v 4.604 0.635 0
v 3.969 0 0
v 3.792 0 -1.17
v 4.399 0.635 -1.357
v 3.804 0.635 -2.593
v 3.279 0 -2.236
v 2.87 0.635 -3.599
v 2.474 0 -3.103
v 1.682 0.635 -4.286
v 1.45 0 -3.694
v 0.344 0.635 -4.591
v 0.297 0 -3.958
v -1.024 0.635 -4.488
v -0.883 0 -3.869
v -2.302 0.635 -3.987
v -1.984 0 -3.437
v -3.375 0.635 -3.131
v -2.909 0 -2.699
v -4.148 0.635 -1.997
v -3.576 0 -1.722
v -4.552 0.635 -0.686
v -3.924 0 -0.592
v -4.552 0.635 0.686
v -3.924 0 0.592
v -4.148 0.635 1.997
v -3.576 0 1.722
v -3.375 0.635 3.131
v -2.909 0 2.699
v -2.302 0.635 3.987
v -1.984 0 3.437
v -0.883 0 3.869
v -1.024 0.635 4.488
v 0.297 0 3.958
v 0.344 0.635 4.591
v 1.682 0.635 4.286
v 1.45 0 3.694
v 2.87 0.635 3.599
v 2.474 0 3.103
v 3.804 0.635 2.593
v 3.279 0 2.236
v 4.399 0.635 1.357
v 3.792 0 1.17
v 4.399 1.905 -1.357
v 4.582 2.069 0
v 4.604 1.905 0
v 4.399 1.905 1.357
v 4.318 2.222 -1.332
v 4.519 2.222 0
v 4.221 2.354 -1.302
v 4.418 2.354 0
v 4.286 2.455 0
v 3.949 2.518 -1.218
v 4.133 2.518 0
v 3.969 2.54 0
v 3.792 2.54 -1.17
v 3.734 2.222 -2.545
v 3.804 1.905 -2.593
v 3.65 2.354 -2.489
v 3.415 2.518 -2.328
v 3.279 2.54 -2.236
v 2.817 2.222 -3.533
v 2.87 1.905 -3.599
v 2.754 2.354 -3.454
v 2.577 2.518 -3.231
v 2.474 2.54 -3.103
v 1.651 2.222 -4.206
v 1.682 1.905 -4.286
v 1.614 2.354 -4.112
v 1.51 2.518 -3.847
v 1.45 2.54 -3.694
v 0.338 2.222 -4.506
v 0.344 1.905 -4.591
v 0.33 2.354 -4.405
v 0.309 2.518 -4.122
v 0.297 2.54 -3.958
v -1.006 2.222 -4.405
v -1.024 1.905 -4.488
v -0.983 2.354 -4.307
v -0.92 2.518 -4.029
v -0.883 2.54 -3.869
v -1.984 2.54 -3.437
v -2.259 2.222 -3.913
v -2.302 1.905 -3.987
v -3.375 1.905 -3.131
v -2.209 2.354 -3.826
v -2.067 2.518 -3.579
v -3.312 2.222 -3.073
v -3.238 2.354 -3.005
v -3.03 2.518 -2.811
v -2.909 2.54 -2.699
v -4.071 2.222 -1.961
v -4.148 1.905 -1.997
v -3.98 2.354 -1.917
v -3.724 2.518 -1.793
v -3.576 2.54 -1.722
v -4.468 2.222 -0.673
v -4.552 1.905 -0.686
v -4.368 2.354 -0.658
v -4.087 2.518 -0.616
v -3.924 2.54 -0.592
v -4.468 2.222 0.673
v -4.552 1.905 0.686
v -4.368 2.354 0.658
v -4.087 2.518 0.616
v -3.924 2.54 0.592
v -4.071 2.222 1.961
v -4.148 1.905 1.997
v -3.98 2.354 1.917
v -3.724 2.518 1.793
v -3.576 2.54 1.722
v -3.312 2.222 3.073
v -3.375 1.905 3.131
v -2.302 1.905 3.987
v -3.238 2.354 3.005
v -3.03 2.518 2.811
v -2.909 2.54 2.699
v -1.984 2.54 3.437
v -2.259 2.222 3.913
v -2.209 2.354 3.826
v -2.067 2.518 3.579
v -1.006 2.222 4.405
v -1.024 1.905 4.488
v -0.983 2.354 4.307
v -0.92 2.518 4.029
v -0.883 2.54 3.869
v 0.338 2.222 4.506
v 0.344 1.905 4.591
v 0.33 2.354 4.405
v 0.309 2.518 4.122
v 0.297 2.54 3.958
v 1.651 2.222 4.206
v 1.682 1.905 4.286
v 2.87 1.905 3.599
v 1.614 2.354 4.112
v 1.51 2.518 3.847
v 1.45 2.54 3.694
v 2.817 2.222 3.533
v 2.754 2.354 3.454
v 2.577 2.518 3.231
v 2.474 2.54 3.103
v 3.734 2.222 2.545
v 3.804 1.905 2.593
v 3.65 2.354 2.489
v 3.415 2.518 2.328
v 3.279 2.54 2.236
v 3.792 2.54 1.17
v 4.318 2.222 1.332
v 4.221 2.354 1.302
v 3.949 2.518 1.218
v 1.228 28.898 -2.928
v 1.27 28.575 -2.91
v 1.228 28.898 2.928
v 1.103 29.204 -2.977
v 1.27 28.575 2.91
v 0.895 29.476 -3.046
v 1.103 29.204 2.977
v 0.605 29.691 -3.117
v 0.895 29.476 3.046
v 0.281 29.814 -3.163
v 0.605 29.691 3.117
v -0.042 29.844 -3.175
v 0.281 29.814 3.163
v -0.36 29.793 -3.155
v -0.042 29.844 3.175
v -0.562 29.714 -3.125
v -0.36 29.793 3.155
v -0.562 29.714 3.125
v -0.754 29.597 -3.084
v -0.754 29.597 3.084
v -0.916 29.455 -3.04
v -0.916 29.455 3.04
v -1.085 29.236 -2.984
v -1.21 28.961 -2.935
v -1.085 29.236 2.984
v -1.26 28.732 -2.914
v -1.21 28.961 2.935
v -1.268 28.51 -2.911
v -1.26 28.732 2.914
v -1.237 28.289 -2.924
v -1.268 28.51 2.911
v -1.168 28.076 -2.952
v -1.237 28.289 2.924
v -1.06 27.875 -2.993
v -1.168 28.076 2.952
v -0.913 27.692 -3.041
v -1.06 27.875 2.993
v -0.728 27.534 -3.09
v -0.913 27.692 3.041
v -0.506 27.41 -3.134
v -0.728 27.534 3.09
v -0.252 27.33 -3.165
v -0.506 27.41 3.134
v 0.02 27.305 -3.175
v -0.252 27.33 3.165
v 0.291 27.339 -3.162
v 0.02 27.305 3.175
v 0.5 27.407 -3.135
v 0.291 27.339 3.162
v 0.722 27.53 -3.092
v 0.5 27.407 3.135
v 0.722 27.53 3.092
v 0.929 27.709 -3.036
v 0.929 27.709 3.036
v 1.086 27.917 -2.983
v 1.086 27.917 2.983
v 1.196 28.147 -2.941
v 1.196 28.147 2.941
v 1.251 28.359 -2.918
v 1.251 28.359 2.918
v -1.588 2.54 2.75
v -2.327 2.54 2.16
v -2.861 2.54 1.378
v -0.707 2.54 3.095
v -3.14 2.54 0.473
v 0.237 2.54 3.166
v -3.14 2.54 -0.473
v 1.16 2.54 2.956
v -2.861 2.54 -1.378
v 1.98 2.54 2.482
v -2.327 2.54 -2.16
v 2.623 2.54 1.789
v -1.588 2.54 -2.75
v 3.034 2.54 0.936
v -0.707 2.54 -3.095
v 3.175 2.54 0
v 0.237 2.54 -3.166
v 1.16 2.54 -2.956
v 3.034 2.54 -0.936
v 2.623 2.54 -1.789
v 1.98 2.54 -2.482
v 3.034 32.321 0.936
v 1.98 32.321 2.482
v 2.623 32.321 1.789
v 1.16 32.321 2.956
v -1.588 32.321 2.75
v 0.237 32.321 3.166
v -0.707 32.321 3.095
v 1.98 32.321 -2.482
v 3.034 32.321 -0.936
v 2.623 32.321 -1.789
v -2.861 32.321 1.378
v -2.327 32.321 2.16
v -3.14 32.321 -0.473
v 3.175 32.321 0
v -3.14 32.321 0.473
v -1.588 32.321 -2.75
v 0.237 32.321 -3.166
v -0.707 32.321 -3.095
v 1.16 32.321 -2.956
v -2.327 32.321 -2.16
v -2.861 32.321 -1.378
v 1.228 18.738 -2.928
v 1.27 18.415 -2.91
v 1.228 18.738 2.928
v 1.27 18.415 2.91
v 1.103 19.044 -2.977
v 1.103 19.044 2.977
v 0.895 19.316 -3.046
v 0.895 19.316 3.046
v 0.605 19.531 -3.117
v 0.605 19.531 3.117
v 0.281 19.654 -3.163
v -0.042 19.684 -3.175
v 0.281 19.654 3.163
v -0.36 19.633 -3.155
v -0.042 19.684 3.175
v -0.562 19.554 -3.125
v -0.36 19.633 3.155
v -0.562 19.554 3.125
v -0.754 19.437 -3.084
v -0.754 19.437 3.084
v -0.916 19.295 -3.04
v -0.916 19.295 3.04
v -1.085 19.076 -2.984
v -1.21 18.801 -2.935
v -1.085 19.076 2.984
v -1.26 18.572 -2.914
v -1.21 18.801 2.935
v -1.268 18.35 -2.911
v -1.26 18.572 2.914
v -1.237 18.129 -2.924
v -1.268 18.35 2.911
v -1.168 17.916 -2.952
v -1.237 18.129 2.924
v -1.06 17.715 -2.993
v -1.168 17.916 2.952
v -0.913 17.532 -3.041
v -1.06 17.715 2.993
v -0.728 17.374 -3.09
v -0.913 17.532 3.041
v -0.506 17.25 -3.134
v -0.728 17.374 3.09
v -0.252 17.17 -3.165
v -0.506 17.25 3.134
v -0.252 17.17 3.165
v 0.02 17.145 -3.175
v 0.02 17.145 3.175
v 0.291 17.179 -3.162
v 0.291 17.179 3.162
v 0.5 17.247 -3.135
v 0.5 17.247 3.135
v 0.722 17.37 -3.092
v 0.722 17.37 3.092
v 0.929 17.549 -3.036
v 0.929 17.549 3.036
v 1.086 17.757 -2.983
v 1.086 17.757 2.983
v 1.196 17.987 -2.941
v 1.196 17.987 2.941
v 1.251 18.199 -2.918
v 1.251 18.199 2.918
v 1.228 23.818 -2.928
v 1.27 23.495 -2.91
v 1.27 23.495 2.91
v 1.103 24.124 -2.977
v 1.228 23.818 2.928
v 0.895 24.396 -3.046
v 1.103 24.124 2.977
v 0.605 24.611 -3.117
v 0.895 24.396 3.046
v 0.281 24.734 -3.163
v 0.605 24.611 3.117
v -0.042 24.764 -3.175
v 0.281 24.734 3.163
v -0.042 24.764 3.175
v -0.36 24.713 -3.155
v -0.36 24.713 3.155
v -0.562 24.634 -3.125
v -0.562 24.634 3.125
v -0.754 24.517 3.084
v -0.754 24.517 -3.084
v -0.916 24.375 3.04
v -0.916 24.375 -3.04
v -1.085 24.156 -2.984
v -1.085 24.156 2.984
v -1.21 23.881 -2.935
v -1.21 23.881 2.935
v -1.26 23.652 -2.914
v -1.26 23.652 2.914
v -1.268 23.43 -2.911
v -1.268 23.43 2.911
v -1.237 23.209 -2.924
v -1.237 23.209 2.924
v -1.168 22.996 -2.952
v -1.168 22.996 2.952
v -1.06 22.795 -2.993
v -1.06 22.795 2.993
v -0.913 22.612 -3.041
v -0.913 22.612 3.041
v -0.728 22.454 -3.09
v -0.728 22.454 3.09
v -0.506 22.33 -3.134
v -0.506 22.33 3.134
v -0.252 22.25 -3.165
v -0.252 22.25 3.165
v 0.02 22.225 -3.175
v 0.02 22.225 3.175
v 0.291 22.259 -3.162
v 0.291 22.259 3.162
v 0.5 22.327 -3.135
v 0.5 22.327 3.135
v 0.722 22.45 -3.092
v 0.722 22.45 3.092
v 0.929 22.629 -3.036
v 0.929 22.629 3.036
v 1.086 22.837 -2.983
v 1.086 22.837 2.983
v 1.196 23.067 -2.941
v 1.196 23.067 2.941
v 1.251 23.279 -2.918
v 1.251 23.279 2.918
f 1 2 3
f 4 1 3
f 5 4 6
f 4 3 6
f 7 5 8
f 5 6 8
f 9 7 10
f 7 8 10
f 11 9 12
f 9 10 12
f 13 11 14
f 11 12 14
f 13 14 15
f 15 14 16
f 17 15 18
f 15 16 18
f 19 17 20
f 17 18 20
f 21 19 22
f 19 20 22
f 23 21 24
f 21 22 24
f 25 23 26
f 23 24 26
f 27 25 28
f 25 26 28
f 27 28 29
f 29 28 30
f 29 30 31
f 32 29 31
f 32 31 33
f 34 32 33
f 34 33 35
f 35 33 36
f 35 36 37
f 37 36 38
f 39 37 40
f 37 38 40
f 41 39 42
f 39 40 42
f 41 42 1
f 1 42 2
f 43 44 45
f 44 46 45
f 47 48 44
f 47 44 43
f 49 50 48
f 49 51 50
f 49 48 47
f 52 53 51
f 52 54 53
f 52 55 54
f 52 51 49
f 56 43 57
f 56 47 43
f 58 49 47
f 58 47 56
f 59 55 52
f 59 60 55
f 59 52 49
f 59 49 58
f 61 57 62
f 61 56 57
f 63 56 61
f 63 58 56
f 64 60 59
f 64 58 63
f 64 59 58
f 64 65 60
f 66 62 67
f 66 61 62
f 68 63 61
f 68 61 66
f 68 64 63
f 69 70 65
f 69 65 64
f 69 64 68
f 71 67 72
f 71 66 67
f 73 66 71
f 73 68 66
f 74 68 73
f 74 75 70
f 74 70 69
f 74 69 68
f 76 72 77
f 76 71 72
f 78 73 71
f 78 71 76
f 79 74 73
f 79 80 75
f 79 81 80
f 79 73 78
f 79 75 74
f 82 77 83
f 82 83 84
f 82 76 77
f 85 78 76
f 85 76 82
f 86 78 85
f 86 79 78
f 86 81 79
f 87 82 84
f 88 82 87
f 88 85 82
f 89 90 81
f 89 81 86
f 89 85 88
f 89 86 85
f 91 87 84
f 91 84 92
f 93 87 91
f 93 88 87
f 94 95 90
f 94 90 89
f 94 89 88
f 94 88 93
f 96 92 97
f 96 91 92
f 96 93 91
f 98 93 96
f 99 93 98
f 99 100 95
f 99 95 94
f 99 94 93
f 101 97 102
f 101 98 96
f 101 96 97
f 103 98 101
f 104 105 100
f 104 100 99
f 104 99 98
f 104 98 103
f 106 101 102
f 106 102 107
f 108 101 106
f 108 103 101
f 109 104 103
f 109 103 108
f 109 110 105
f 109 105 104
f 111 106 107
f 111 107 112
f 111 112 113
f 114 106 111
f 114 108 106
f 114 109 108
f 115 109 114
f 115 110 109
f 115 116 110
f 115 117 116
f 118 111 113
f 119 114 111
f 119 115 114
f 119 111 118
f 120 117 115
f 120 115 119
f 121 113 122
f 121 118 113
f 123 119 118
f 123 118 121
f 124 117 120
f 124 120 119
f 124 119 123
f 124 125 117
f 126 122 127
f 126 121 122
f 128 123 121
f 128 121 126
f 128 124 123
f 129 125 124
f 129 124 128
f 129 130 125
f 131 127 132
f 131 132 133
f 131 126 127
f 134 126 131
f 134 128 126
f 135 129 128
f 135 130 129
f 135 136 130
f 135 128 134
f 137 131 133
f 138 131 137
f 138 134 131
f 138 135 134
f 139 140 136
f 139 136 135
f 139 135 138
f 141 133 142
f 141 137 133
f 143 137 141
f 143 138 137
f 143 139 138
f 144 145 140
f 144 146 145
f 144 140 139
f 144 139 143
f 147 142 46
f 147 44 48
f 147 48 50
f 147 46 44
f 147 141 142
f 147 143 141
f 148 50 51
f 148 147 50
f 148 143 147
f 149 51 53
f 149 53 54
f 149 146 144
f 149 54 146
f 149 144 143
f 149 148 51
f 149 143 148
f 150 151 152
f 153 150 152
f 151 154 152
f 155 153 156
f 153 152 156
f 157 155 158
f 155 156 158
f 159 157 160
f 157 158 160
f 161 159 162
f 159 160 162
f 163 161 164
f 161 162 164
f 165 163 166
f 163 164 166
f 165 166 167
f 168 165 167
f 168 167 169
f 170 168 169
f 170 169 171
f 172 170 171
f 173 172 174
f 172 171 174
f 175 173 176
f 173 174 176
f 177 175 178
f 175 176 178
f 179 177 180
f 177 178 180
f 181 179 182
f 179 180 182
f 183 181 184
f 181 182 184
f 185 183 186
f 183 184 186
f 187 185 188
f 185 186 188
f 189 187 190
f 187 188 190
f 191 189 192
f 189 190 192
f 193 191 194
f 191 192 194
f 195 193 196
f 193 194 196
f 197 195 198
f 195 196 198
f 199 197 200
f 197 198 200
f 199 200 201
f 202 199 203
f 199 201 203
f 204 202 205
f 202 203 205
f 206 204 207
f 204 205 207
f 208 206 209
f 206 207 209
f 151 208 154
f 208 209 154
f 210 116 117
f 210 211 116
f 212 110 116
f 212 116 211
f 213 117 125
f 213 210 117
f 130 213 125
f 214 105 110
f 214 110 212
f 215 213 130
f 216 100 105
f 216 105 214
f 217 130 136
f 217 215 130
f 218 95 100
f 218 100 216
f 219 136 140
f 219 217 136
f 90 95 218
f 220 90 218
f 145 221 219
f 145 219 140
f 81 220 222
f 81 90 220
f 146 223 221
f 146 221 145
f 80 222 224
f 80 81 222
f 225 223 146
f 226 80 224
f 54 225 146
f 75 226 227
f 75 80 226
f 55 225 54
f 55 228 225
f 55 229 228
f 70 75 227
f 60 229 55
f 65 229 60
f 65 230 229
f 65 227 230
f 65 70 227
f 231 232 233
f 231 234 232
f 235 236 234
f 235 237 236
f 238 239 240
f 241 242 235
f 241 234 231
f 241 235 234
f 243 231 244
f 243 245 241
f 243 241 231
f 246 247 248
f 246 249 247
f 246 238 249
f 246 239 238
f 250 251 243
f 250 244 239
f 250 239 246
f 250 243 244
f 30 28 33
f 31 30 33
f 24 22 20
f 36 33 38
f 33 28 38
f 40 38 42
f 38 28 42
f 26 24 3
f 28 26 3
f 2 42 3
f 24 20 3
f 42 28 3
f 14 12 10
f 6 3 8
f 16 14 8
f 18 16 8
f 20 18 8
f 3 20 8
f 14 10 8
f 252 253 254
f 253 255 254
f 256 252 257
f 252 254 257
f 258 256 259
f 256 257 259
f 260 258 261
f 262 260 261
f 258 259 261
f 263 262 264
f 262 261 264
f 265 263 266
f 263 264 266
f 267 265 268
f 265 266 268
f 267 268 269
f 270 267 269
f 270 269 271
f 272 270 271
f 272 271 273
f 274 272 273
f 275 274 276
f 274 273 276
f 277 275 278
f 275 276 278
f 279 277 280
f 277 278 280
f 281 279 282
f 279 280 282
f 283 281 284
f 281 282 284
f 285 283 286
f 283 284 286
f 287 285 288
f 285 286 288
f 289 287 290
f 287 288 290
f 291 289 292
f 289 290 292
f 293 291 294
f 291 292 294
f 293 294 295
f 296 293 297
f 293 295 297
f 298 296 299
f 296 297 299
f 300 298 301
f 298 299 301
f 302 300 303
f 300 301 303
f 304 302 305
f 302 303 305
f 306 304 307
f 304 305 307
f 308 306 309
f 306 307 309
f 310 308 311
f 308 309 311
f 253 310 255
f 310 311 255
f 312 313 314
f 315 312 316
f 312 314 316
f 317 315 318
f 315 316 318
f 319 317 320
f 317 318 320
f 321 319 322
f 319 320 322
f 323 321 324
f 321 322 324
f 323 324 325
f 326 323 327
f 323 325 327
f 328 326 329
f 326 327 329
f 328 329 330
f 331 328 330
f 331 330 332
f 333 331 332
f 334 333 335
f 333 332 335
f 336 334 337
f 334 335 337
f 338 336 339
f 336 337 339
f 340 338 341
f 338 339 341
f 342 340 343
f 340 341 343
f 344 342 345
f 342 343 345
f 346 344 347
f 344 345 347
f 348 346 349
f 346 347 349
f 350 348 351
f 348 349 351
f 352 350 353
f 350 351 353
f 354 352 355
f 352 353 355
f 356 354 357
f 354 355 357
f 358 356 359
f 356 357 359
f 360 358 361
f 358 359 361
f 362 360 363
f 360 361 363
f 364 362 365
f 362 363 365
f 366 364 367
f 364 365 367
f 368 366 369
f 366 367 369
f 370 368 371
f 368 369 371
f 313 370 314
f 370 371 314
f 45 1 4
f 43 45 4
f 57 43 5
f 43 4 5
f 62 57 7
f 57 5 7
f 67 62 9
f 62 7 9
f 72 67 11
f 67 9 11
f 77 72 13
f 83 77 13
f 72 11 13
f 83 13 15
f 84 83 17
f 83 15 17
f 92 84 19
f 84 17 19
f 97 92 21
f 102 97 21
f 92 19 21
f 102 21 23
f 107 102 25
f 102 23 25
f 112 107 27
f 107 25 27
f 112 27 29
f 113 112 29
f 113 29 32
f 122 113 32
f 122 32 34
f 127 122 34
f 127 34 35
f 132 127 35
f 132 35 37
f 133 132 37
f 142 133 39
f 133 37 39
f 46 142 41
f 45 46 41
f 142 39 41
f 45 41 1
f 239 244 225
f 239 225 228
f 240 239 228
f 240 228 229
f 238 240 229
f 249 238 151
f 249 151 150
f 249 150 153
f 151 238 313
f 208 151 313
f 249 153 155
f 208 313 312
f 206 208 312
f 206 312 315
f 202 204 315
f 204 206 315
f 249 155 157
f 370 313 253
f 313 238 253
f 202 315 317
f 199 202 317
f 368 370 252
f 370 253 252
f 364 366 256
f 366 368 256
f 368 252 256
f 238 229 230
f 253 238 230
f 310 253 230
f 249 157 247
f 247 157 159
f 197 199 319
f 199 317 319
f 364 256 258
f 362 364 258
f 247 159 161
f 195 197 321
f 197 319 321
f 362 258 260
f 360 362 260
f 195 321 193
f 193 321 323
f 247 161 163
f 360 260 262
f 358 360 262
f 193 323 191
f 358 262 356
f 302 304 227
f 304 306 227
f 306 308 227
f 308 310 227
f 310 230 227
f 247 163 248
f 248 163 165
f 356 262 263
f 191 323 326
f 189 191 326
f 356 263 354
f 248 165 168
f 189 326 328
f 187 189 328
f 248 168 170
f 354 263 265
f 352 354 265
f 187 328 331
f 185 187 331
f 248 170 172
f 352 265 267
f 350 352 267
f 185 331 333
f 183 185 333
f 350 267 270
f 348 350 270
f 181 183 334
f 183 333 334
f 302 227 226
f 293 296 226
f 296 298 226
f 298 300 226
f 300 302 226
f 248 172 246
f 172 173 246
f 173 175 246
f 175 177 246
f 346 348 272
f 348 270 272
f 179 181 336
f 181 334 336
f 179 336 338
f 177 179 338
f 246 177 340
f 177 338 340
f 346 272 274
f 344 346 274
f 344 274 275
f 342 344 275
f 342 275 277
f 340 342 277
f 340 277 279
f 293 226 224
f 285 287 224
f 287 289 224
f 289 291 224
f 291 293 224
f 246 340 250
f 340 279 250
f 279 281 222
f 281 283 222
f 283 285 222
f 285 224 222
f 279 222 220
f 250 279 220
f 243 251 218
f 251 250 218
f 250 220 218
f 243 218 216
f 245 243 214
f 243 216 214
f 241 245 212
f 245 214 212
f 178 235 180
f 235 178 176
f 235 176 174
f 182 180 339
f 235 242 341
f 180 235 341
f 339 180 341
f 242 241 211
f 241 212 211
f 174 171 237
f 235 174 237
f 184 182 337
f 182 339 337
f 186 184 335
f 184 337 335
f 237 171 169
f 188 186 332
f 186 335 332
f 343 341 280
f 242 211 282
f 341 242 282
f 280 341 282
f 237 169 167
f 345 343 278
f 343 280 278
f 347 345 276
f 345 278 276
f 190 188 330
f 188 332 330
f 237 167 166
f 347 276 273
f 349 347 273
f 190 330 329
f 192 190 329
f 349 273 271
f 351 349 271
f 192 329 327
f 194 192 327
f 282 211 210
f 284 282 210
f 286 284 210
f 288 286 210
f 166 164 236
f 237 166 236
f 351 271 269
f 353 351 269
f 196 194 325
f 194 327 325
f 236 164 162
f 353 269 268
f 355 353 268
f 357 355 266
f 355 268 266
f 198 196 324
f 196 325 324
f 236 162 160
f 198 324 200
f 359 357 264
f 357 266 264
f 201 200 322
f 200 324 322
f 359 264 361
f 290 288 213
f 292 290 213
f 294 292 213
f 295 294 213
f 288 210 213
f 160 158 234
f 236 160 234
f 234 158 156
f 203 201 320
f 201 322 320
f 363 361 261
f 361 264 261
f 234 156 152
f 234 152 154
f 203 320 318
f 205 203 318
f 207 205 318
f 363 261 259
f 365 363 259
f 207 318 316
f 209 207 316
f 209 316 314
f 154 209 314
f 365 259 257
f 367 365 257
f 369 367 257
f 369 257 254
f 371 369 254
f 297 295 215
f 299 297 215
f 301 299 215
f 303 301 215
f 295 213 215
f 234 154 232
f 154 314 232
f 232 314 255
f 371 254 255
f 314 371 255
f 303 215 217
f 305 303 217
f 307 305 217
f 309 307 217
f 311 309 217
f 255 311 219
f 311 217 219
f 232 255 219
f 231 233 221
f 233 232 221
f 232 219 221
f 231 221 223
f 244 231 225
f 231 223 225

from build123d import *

# Parameters (mm, degrees)
SKETCH1_R               = 4.60375
BOSS_EXTRUDE1_DEPTH     = 2.54
SKETCH2_R               = 3.175
BOSS_EXTRUDE2_DEPTH     = 45.72
SKETCH3_R               = 1.27
CUT_EXTRUDE1_DEPTH      = 5.60375
CUT_EXTRUDE1_DEPTH_BACK = 5.60375
FILLET1_R               = 0.635
CHAMFER1_SIZE           = 0.635
SKETCH4_W               = 16.845680721
SKETCH4_H               = 19.604839444
CUT_EXTRUDE2_DEPTH      = 5.60375
CUT_EXTRUDE2_DEPTH_BACK = 5.6037501


with BuildPart() as part:
    # Sketch1 → Boss-Extrude1 (new body)
    with BuildSketch(Plane(origin=(0, 0, 0), x_dir=(1, 0, 0), z_dir=(0, 1, 0))):
        Circle(SKETCH1_R)
    extrude(amount=BOSS_EXTRUDE1_DEPTH)

    # Sketch2 → Boss-Extrude2 (add)
    with BuildSketch(Plane(origin=(0, 2.54, 0), x_dir=(1, 0, 0), z_dir=(0, 1, 0))):
        Circle(SKETCH2_R)
    extrude(amount=BOSS_EXTRUDE2_DEPTH)

    # Sketch3 → Cut-Extrude1 (cut, two sides)
    with BuildSketch(Plane.XY) as cut_extrude1_sk:
        with Locations((0, 18.415)):
            Circle(SKETCH3_R)
        with Locations((0, 23.495)):
            Circle(SKETCH3_R)
        with Locations((0, 28.575)):
            Circle(SKETCH3_R)
        with Locations((0, 33.655)):
            Circle(SKETCH3_R)
        with Locations((0, 38.735)):
            Circle(SKETCH3_R)
        with Locations((0, 43.815)):
            Circle(SKETCH3_R)
    extrude(amount=CUT_EXTRUDE1_DEPTH, mode=Mode.SUBTRACT)
    extrude(cut_extrude1_sk.sketch, amount=-CUT_EXTRUDE1_DEPTH_BACK, mode=Mode.SUBTRACT)

    # Fillet1
    fillet1_edges = [part.edges().sort_by_distance(p)[0] for p in [
        (-4.60375, 2.54, 0),
    ]]
    fillet(fillet1_edges, radius=FILLET1_R)

    # Chamfer1
    chamfer1_edges = [part.edges().sort_by_distance(p)[0] for p in [
        (-4.60375, 0, 0),
    ]]
    chamfer(chamfer1_edges, length=CHAMFER1_SIZE)

    # Sketch4 → Cut-Extrude2 (cut, two sides)
    with BuildSketch(Plane(origin=(0, 0, 0), x_dir=(0, 0, -1), z_dir=(1, 0, 0))) as cut_extrude2_sk:
        with Locations((1.010740844, 42.122953468)):
            Rectangle(SKETCH4_W, SKETCH4_H)
    extrude(amount=CUT_EXTRUDE2_DEPTH, mode=Mode.SUBTRACT)
    extrude(cut_extrude2_sk.sketch, amount=-CUT_EXTRUDE2_DEPTH_BACK, mode=Mode.SUBTRACT)


solid = part.part
